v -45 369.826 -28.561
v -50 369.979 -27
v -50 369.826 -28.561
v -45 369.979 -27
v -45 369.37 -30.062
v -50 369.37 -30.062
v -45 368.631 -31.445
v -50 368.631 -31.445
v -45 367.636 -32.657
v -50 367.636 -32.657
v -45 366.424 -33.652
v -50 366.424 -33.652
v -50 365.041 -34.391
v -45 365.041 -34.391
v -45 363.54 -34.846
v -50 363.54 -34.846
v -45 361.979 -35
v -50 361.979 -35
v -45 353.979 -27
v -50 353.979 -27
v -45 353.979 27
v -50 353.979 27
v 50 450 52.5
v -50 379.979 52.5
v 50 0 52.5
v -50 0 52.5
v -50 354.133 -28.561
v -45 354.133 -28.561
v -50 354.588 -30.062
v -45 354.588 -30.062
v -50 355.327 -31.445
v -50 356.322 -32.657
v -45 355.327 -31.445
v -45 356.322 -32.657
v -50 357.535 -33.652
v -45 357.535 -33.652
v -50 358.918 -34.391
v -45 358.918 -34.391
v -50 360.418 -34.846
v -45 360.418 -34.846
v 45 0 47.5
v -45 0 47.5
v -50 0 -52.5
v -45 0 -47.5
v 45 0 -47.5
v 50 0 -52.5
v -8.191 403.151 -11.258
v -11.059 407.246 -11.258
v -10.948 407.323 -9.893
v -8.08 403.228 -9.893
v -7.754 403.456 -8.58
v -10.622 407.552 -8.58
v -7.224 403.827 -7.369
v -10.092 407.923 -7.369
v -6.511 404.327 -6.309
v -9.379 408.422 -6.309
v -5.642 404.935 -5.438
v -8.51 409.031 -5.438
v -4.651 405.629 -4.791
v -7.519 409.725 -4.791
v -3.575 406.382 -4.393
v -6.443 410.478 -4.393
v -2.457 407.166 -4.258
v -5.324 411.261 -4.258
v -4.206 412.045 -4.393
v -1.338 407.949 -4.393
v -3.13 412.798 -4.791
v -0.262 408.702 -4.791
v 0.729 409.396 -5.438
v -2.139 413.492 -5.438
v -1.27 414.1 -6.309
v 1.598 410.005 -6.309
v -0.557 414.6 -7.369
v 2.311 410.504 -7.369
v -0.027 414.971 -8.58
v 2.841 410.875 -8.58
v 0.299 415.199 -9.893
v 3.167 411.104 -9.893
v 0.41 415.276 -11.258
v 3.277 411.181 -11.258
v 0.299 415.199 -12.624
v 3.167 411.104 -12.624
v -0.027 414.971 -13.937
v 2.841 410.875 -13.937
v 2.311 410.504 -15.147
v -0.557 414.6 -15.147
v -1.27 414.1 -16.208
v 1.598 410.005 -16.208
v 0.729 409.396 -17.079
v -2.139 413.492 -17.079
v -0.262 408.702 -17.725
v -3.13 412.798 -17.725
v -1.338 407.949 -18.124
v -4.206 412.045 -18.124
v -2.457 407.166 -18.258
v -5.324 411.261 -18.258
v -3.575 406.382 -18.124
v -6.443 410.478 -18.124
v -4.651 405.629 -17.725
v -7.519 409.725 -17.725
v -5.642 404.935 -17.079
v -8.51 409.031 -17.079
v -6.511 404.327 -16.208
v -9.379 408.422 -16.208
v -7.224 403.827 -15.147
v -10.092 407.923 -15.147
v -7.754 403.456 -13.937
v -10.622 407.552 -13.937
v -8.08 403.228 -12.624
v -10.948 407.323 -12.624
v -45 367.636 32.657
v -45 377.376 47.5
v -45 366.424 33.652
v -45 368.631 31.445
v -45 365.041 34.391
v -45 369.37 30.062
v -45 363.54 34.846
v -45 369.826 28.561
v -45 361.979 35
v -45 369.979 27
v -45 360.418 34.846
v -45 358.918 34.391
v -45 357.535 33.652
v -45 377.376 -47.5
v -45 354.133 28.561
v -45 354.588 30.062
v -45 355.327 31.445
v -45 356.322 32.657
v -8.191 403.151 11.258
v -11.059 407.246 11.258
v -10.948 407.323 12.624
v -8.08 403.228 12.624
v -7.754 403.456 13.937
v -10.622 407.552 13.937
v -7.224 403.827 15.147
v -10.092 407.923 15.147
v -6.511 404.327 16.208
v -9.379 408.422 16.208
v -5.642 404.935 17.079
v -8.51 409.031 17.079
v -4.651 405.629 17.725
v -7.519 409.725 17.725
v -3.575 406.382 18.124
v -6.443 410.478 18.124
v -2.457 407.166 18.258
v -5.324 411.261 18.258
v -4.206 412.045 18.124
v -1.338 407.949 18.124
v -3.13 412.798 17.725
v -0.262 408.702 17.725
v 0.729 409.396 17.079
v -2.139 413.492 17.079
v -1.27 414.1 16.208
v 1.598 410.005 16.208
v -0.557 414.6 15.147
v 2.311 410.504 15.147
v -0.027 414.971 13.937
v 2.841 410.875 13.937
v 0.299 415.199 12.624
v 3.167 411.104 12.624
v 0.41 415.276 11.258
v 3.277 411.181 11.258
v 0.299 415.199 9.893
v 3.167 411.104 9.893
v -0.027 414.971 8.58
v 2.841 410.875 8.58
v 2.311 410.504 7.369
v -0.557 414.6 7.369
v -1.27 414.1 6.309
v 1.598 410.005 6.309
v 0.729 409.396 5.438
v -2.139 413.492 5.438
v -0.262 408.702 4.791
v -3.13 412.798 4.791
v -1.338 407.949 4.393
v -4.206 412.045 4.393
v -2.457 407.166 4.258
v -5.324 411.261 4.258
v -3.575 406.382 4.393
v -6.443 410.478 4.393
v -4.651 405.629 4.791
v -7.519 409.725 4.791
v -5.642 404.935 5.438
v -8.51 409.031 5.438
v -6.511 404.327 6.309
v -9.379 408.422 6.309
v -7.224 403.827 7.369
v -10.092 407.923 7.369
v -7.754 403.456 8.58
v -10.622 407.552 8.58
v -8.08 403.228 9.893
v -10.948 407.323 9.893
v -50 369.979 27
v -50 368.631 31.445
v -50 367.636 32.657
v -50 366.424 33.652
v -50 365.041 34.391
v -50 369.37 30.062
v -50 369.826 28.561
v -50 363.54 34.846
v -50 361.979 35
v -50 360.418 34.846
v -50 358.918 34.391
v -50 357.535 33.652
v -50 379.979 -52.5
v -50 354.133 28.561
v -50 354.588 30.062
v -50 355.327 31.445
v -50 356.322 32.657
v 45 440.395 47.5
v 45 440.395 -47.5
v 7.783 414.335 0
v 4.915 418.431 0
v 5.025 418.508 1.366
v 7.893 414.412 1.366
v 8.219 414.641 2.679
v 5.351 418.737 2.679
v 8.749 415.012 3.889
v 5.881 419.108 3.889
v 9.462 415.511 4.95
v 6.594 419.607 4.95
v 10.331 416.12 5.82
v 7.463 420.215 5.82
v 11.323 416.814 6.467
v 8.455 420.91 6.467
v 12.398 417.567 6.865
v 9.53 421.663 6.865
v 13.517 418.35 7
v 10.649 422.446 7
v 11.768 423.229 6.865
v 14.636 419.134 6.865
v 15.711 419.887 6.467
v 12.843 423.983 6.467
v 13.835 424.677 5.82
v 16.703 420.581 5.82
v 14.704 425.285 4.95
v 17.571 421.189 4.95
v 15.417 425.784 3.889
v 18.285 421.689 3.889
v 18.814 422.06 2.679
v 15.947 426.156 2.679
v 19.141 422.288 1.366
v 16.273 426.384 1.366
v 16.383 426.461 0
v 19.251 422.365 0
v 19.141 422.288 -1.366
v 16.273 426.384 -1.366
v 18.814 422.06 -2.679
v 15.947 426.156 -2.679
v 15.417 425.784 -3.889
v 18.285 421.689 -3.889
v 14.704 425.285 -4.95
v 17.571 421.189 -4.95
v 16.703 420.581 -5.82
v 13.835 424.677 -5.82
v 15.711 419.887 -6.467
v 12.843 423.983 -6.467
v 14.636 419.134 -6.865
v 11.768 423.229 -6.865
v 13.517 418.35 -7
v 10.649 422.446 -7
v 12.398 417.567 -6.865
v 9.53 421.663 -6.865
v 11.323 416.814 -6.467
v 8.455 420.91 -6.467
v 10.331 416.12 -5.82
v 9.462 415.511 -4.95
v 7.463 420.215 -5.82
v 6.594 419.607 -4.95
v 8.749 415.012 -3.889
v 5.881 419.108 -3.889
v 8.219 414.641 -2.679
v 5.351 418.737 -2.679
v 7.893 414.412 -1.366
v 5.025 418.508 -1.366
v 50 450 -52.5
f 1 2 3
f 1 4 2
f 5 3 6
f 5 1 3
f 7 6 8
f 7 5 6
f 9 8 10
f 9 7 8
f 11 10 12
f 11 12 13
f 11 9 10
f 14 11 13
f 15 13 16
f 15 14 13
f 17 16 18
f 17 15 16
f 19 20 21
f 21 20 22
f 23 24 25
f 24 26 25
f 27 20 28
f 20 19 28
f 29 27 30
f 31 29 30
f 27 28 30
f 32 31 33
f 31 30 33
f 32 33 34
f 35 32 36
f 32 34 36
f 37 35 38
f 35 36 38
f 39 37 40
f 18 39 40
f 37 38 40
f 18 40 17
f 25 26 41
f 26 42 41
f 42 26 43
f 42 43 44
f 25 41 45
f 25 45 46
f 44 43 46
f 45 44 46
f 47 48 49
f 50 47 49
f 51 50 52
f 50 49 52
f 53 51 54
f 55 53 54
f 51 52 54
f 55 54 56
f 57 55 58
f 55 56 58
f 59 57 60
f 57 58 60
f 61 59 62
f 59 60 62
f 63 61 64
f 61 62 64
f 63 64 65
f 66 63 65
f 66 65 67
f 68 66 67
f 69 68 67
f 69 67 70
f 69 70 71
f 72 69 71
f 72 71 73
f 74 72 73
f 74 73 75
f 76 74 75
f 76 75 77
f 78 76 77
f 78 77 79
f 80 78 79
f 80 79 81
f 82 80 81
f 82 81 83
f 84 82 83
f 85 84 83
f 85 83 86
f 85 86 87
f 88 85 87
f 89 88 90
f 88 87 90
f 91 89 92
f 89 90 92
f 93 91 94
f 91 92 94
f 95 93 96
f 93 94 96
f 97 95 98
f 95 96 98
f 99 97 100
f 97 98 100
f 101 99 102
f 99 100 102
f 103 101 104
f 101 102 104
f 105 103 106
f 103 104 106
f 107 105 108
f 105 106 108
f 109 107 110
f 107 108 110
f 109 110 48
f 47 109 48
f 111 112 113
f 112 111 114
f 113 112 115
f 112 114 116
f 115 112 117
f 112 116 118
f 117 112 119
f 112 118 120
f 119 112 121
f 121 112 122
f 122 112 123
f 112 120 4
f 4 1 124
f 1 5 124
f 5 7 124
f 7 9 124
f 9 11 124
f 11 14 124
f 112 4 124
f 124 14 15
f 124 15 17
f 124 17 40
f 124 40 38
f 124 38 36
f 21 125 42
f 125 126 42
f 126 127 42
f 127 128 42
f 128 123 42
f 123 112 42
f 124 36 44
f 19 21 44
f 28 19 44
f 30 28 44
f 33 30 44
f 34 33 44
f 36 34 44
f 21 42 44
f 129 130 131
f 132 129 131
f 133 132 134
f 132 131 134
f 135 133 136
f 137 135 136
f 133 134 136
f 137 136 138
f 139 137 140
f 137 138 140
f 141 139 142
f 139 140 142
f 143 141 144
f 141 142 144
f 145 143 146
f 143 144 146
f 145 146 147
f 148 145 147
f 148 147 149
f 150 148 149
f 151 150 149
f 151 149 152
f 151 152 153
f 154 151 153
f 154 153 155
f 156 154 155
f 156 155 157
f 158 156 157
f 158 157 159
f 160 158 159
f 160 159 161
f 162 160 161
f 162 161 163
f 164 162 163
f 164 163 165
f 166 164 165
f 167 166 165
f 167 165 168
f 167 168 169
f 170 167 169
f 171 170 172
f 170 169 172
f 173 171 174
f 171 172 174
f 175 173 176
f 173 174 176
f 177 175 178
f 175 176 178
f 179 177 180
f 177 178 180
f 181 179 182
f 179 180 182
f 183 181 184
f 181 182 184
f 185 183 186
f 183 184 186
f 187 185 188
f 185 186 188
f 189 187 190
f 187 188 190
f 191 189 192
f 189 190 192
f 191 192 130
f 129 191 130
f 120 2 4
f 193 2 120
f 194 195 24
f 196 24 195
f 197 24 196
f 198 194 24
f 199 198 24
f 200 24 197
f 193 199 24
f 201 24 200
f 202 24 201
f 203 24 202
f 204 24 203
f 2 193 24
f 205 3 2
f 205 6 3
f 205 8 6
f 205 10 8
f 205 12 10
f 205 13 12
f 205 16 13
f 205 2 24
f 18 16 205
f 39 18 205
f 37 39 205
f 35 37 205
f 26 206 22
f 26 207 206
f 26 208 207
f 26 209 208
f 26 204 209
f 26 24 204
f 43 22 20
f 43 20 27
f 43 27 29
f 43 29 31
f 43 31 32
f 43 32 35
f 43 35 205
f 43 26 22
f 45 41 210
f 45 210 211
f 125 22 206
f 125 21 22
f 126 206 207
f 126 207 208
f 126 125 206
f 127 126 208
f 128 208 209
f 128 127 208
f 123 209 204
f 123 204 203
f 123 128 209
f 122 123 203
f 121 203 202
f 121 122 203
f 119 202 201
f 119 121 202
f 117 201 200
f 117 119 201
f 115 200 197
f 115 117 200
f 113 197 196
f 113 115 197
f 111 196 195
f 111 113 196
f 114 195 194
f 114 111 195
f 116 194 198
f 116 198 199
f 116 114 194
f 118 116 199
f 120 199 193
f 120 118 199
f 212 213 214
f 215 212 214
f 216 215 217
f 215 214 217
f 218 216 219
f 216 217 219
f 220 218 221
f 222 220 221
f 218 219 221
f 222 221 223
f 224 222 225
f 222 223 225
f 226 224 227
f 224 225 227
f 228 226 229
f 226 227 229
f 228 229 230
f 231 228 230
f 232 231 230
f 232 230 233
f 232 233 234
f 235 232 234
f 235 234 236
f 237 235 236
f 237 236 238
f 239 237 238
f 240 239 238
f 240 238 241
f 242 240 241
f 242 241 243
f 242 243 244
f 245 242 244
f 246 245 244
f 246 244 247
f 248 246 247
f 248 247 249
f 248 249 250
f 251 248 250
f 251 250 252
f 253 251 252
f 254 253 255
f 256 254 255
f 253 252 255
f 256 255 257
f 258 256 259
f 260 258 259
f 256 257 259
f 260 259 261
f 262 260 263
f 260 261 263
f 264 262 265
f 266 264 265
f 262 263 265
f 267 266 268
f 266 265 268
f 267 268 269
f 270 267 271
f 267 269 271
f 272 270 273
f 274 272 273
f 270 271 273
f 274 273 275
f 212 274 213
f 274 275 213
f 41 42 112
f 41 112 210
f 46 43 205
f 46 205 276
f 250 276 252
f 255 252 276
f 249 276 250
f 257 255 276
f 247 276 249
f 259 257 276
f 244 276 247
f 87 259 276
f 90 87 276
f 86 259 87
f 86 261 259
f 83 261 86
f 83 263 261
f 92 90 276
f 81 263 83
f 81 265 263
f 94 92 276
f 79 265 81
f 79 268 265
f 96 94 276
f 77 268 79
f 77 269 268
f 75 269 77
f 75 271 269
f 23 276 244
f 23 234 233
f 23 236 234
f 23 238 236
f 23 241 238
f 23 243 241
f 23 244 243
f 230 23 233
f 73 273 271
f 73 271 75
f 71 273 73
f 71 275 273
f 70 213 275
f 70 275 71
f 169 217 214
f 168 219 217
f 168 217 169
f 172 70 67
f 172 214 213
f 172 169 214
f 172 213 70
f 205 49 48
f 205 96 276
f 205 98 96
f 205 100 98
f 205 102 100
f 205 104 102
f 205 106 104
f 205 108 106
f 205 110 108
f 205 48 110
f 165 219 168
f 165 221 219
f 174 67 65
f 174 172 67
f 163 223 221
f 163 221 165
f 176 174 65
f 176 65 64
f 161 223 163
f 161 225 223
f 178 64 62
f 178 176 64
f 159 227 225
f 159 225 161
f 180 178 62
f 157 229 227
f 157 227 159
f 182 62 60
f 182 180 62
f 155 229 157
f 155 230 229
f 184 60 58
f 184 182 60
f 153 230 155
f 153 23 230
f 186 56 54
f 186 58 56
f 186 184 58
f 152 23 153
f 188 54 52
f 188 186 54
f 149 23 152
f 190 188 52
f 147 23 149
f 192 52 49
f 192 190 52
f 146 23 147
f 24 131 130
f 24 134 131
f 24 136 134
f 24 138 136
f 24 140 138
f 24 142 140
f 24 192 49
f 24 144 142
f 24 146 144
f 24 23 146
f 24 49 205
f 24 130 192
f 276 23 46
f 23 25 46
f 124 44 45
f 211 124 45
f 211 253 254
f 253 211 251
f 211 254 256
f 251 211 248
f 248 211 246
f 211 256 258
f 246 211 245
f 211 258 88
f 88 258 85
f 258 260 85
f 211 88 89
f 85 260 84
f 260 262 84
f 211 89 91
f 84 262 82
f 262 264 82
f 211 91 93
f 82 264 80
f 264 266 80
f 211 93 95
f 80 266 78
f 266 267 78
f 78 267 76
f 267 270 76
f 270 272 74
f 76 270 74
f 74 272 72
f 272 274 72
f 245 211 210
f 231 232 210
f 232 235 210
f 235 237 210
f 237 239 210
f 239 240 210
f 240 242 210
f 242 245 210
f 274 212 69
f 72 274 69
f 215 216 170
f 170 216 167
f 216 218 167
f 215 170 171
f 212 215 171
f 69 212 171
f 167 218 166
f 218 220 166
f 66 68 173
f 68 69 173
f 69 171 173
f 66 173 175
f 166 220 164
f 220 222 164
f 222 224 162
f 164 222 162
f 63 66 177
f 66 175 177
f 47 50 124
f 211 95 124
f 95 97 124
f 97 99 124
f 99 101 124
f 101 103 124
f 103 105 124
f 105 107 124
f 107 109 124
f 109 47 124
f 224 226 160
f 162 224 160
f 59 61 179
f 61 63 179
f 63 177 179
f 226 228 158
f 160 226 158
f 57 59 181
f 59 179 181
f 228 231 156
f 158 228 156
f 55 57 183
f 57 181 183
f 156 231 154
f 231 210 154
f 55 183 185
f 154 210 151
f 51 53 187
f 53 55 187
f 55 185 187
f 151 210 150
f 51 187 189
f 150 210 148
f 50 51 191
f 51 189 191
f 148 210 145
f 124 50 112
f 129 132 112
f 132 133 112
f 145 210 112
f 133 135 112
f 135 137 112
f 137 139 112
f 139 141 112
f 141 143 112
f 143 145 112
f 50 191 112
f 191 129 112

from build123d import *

# Parameters (mm, degrees)
SKETCH1_W           = 100
SKETCH1_H           = 105
BOSS_EXTRUDE1_DEPTH = 350
SKETCH2_W           = 100
SKETCH2_H           = 105
BOSS_EXTRUDE2_DEPTH = 100
CUT_EXTRUDE1_REACH  = 466.785
SHELL1_T            = -5
CUT_EXTRUDE2_REACH  = 376.584
SKETCH4_R           = 7
CUT_EXTRUDE3_REACH  = 465.957
SKETCH5_W           = 70
SKETCH5_H           = 16
FILLET1_R           = 8


with BuildPart() as part:
    # Sketch1 → Boss-Extrude1 (new body)
    with BuildSketch(Plane(origin=(0, 0, 0), x_dir=(1, 0, 0), z_dir=(0, 1, 0))):
        Rectangle(SKETCH1_W, SKETCH1_H)
    extrude(amount=BOSS_EXTRUDE1_DEPTH)

    # Sketch2 → Boss-Extrude2 (add)
    with BuildSketch(Plane(origin=(0, 350, 0), x_dir=(1, 0, 0), z_dir=(0, 1, 0))):
        Rectangle(SKETCH2_W, SKETCH2_H)
    extrude(amount=BOSS_EXTRUDE2_DEPTH)

    # Sketch3 → Cut-Extrude1 (cut, up to next)
    with BuildSketch(Plane.XY.offset(52.5), mode=Mode.PRIVATE) as cut_extrude1_sk1:
        Polygon((-50, 450), (50, 450), (-50, 379.979246179), align=None)
    cut_extrude1_tool1 = extrude(cut_extrude1_sk1.sketch, amount=-CUT_EXTRUDE1_REACH, mode=Mode.PRIVATE) & part.part
    add(cut_extrude1_tool1.solids().sort_by_distance((-16.666667, 426.659749, 52.5))[0], mode=Mode.SUBTRACT)

    # Shell1
    shell1_openings = [part.faces().sort_by_distance(p)[0] for p in [
        (0, 0, 0),
    ]]
    offset(amount=SHELL1_T, openings=shell1_openings, kind=Kind.INTERSECTION)

    # Sketch4 → Cut-Extrude2 (cut, up to next)
    with BuildSketch(Plane(origin=(-194.98134326, 278.462216729, 0), x_dir=(0.8191520442889949, 0.5735764363510417, 0), z_dir=(-0.5735764363510417, 0.819152044288995, 0)), mode=Mode.PRIVATE) as cut_extrude2_sk1:
        with Locations(Location((251.028269134, 0, 0), (0, 0, 180))):
            Circle(SKETCH4_R)
    cut_extrude2_tool1 = extrude(cut_extrude2_sk1.sketch, amount=-CUT_EXTRUDE2_REACH, mode=Mode.PRIVATE) & part.part
    # Sketch4 → Cut-Extrude2 (cut, up to next)
    with BuildSketch(Plane(origin=(-194.98134326, 278.462216729, 0), x_dir=(0.8191520442889949, 0.5735764363510417, 0), z_dir=(-0.5735764363510417, 0.819152044288995, 0)), mode=Mode.PRIVATE) as cut_extrude2_sk2:
        with Locations(Location((231.528269134, -11.258330249, 0), (0, 0, 180))):
            Circle(SKETCH4_R)
    cut_extrude2_tool2 = extrude(cut_extrude2_sk2.sketch, amount=-CUT_EXTRUDE2_REACH, mode=Mode.PRIVATE) & part.part
    # Sketch4 → Cut-Extrude2 (cut, up to next)
    with BuildSketch(Plane(origin=(-194.98134326, 278.462216729, 0), x_dir=(0.8191520442889949, 0.5735764363510417, 0), z_dir=(-0.5735764363510417, 0.819152044288995, 0)), mode=Mode.PRIVATE) as cut_extrude2_sk3:
        with Locations(Location((231.528269134, 11.258330249, 0), (0, 0, 180))):
            Circle(SKETCH4_R)
    cut_extrude2_tool3 = extrude(cut_extrude2_sk3.sketch, amount=-CUT_EXTRUDE2_REACH, mode=Mode.PRIVATE) & part.part
    add(cut_extrude2_tool1.solids().sort_by_distance((10.648977, 422.446117, 0))[0], mode=Mode.SUBTRACT)
    add(cut_extrude2_tool2.solids().sort_by_distance((-5.324488, 411.261376, 11.25833))[0], mode=Mode.SUBTRACT)
    add(cut_extrude2_tool3.solids().sort_by_distance((-5.324488, 411.261376, -11.25833))[0], mode=Mode.SUBTRACT)

    # Sketch5 → Cut-Extrude3 (cut, up to next)
    with BuildSketch(Plane.ZY.offset(50), mode=Mode.PRIVATE) as cut_extrude3_sk1:
        with Locations((0, 361.979246179)):
            Rectangle(SKETCH5_W, SKETCH5_H)
    cut_extrude3_tool1 = extrude(cut_extrude3_sk1.sketch, amount=-CUT_EXTRUDE3_REACH, mode=Mode.PRIVATE) & part.part
    add(cut_extrude3_tool1.solids().sort_by_distance((-50, 361.979246, 0))[0], mode=Mode.SUBTRACT)

    # Fillet1
    fillet1_edges = [part.edges().sort_by_distance(p)[0] for p in [
        (-47.5, 353.979246179, 35),
        (-47.5, 369.979246179, 35),
        (-47.5, 353.979246179, -35),
        (-47.5, 369.979246179, -35),
    ]]
    fillet(fillet1_edges, radius=FILLET1_R - 0.0001)  # a hair under: the kernel refuses the full size


solid = part.part
